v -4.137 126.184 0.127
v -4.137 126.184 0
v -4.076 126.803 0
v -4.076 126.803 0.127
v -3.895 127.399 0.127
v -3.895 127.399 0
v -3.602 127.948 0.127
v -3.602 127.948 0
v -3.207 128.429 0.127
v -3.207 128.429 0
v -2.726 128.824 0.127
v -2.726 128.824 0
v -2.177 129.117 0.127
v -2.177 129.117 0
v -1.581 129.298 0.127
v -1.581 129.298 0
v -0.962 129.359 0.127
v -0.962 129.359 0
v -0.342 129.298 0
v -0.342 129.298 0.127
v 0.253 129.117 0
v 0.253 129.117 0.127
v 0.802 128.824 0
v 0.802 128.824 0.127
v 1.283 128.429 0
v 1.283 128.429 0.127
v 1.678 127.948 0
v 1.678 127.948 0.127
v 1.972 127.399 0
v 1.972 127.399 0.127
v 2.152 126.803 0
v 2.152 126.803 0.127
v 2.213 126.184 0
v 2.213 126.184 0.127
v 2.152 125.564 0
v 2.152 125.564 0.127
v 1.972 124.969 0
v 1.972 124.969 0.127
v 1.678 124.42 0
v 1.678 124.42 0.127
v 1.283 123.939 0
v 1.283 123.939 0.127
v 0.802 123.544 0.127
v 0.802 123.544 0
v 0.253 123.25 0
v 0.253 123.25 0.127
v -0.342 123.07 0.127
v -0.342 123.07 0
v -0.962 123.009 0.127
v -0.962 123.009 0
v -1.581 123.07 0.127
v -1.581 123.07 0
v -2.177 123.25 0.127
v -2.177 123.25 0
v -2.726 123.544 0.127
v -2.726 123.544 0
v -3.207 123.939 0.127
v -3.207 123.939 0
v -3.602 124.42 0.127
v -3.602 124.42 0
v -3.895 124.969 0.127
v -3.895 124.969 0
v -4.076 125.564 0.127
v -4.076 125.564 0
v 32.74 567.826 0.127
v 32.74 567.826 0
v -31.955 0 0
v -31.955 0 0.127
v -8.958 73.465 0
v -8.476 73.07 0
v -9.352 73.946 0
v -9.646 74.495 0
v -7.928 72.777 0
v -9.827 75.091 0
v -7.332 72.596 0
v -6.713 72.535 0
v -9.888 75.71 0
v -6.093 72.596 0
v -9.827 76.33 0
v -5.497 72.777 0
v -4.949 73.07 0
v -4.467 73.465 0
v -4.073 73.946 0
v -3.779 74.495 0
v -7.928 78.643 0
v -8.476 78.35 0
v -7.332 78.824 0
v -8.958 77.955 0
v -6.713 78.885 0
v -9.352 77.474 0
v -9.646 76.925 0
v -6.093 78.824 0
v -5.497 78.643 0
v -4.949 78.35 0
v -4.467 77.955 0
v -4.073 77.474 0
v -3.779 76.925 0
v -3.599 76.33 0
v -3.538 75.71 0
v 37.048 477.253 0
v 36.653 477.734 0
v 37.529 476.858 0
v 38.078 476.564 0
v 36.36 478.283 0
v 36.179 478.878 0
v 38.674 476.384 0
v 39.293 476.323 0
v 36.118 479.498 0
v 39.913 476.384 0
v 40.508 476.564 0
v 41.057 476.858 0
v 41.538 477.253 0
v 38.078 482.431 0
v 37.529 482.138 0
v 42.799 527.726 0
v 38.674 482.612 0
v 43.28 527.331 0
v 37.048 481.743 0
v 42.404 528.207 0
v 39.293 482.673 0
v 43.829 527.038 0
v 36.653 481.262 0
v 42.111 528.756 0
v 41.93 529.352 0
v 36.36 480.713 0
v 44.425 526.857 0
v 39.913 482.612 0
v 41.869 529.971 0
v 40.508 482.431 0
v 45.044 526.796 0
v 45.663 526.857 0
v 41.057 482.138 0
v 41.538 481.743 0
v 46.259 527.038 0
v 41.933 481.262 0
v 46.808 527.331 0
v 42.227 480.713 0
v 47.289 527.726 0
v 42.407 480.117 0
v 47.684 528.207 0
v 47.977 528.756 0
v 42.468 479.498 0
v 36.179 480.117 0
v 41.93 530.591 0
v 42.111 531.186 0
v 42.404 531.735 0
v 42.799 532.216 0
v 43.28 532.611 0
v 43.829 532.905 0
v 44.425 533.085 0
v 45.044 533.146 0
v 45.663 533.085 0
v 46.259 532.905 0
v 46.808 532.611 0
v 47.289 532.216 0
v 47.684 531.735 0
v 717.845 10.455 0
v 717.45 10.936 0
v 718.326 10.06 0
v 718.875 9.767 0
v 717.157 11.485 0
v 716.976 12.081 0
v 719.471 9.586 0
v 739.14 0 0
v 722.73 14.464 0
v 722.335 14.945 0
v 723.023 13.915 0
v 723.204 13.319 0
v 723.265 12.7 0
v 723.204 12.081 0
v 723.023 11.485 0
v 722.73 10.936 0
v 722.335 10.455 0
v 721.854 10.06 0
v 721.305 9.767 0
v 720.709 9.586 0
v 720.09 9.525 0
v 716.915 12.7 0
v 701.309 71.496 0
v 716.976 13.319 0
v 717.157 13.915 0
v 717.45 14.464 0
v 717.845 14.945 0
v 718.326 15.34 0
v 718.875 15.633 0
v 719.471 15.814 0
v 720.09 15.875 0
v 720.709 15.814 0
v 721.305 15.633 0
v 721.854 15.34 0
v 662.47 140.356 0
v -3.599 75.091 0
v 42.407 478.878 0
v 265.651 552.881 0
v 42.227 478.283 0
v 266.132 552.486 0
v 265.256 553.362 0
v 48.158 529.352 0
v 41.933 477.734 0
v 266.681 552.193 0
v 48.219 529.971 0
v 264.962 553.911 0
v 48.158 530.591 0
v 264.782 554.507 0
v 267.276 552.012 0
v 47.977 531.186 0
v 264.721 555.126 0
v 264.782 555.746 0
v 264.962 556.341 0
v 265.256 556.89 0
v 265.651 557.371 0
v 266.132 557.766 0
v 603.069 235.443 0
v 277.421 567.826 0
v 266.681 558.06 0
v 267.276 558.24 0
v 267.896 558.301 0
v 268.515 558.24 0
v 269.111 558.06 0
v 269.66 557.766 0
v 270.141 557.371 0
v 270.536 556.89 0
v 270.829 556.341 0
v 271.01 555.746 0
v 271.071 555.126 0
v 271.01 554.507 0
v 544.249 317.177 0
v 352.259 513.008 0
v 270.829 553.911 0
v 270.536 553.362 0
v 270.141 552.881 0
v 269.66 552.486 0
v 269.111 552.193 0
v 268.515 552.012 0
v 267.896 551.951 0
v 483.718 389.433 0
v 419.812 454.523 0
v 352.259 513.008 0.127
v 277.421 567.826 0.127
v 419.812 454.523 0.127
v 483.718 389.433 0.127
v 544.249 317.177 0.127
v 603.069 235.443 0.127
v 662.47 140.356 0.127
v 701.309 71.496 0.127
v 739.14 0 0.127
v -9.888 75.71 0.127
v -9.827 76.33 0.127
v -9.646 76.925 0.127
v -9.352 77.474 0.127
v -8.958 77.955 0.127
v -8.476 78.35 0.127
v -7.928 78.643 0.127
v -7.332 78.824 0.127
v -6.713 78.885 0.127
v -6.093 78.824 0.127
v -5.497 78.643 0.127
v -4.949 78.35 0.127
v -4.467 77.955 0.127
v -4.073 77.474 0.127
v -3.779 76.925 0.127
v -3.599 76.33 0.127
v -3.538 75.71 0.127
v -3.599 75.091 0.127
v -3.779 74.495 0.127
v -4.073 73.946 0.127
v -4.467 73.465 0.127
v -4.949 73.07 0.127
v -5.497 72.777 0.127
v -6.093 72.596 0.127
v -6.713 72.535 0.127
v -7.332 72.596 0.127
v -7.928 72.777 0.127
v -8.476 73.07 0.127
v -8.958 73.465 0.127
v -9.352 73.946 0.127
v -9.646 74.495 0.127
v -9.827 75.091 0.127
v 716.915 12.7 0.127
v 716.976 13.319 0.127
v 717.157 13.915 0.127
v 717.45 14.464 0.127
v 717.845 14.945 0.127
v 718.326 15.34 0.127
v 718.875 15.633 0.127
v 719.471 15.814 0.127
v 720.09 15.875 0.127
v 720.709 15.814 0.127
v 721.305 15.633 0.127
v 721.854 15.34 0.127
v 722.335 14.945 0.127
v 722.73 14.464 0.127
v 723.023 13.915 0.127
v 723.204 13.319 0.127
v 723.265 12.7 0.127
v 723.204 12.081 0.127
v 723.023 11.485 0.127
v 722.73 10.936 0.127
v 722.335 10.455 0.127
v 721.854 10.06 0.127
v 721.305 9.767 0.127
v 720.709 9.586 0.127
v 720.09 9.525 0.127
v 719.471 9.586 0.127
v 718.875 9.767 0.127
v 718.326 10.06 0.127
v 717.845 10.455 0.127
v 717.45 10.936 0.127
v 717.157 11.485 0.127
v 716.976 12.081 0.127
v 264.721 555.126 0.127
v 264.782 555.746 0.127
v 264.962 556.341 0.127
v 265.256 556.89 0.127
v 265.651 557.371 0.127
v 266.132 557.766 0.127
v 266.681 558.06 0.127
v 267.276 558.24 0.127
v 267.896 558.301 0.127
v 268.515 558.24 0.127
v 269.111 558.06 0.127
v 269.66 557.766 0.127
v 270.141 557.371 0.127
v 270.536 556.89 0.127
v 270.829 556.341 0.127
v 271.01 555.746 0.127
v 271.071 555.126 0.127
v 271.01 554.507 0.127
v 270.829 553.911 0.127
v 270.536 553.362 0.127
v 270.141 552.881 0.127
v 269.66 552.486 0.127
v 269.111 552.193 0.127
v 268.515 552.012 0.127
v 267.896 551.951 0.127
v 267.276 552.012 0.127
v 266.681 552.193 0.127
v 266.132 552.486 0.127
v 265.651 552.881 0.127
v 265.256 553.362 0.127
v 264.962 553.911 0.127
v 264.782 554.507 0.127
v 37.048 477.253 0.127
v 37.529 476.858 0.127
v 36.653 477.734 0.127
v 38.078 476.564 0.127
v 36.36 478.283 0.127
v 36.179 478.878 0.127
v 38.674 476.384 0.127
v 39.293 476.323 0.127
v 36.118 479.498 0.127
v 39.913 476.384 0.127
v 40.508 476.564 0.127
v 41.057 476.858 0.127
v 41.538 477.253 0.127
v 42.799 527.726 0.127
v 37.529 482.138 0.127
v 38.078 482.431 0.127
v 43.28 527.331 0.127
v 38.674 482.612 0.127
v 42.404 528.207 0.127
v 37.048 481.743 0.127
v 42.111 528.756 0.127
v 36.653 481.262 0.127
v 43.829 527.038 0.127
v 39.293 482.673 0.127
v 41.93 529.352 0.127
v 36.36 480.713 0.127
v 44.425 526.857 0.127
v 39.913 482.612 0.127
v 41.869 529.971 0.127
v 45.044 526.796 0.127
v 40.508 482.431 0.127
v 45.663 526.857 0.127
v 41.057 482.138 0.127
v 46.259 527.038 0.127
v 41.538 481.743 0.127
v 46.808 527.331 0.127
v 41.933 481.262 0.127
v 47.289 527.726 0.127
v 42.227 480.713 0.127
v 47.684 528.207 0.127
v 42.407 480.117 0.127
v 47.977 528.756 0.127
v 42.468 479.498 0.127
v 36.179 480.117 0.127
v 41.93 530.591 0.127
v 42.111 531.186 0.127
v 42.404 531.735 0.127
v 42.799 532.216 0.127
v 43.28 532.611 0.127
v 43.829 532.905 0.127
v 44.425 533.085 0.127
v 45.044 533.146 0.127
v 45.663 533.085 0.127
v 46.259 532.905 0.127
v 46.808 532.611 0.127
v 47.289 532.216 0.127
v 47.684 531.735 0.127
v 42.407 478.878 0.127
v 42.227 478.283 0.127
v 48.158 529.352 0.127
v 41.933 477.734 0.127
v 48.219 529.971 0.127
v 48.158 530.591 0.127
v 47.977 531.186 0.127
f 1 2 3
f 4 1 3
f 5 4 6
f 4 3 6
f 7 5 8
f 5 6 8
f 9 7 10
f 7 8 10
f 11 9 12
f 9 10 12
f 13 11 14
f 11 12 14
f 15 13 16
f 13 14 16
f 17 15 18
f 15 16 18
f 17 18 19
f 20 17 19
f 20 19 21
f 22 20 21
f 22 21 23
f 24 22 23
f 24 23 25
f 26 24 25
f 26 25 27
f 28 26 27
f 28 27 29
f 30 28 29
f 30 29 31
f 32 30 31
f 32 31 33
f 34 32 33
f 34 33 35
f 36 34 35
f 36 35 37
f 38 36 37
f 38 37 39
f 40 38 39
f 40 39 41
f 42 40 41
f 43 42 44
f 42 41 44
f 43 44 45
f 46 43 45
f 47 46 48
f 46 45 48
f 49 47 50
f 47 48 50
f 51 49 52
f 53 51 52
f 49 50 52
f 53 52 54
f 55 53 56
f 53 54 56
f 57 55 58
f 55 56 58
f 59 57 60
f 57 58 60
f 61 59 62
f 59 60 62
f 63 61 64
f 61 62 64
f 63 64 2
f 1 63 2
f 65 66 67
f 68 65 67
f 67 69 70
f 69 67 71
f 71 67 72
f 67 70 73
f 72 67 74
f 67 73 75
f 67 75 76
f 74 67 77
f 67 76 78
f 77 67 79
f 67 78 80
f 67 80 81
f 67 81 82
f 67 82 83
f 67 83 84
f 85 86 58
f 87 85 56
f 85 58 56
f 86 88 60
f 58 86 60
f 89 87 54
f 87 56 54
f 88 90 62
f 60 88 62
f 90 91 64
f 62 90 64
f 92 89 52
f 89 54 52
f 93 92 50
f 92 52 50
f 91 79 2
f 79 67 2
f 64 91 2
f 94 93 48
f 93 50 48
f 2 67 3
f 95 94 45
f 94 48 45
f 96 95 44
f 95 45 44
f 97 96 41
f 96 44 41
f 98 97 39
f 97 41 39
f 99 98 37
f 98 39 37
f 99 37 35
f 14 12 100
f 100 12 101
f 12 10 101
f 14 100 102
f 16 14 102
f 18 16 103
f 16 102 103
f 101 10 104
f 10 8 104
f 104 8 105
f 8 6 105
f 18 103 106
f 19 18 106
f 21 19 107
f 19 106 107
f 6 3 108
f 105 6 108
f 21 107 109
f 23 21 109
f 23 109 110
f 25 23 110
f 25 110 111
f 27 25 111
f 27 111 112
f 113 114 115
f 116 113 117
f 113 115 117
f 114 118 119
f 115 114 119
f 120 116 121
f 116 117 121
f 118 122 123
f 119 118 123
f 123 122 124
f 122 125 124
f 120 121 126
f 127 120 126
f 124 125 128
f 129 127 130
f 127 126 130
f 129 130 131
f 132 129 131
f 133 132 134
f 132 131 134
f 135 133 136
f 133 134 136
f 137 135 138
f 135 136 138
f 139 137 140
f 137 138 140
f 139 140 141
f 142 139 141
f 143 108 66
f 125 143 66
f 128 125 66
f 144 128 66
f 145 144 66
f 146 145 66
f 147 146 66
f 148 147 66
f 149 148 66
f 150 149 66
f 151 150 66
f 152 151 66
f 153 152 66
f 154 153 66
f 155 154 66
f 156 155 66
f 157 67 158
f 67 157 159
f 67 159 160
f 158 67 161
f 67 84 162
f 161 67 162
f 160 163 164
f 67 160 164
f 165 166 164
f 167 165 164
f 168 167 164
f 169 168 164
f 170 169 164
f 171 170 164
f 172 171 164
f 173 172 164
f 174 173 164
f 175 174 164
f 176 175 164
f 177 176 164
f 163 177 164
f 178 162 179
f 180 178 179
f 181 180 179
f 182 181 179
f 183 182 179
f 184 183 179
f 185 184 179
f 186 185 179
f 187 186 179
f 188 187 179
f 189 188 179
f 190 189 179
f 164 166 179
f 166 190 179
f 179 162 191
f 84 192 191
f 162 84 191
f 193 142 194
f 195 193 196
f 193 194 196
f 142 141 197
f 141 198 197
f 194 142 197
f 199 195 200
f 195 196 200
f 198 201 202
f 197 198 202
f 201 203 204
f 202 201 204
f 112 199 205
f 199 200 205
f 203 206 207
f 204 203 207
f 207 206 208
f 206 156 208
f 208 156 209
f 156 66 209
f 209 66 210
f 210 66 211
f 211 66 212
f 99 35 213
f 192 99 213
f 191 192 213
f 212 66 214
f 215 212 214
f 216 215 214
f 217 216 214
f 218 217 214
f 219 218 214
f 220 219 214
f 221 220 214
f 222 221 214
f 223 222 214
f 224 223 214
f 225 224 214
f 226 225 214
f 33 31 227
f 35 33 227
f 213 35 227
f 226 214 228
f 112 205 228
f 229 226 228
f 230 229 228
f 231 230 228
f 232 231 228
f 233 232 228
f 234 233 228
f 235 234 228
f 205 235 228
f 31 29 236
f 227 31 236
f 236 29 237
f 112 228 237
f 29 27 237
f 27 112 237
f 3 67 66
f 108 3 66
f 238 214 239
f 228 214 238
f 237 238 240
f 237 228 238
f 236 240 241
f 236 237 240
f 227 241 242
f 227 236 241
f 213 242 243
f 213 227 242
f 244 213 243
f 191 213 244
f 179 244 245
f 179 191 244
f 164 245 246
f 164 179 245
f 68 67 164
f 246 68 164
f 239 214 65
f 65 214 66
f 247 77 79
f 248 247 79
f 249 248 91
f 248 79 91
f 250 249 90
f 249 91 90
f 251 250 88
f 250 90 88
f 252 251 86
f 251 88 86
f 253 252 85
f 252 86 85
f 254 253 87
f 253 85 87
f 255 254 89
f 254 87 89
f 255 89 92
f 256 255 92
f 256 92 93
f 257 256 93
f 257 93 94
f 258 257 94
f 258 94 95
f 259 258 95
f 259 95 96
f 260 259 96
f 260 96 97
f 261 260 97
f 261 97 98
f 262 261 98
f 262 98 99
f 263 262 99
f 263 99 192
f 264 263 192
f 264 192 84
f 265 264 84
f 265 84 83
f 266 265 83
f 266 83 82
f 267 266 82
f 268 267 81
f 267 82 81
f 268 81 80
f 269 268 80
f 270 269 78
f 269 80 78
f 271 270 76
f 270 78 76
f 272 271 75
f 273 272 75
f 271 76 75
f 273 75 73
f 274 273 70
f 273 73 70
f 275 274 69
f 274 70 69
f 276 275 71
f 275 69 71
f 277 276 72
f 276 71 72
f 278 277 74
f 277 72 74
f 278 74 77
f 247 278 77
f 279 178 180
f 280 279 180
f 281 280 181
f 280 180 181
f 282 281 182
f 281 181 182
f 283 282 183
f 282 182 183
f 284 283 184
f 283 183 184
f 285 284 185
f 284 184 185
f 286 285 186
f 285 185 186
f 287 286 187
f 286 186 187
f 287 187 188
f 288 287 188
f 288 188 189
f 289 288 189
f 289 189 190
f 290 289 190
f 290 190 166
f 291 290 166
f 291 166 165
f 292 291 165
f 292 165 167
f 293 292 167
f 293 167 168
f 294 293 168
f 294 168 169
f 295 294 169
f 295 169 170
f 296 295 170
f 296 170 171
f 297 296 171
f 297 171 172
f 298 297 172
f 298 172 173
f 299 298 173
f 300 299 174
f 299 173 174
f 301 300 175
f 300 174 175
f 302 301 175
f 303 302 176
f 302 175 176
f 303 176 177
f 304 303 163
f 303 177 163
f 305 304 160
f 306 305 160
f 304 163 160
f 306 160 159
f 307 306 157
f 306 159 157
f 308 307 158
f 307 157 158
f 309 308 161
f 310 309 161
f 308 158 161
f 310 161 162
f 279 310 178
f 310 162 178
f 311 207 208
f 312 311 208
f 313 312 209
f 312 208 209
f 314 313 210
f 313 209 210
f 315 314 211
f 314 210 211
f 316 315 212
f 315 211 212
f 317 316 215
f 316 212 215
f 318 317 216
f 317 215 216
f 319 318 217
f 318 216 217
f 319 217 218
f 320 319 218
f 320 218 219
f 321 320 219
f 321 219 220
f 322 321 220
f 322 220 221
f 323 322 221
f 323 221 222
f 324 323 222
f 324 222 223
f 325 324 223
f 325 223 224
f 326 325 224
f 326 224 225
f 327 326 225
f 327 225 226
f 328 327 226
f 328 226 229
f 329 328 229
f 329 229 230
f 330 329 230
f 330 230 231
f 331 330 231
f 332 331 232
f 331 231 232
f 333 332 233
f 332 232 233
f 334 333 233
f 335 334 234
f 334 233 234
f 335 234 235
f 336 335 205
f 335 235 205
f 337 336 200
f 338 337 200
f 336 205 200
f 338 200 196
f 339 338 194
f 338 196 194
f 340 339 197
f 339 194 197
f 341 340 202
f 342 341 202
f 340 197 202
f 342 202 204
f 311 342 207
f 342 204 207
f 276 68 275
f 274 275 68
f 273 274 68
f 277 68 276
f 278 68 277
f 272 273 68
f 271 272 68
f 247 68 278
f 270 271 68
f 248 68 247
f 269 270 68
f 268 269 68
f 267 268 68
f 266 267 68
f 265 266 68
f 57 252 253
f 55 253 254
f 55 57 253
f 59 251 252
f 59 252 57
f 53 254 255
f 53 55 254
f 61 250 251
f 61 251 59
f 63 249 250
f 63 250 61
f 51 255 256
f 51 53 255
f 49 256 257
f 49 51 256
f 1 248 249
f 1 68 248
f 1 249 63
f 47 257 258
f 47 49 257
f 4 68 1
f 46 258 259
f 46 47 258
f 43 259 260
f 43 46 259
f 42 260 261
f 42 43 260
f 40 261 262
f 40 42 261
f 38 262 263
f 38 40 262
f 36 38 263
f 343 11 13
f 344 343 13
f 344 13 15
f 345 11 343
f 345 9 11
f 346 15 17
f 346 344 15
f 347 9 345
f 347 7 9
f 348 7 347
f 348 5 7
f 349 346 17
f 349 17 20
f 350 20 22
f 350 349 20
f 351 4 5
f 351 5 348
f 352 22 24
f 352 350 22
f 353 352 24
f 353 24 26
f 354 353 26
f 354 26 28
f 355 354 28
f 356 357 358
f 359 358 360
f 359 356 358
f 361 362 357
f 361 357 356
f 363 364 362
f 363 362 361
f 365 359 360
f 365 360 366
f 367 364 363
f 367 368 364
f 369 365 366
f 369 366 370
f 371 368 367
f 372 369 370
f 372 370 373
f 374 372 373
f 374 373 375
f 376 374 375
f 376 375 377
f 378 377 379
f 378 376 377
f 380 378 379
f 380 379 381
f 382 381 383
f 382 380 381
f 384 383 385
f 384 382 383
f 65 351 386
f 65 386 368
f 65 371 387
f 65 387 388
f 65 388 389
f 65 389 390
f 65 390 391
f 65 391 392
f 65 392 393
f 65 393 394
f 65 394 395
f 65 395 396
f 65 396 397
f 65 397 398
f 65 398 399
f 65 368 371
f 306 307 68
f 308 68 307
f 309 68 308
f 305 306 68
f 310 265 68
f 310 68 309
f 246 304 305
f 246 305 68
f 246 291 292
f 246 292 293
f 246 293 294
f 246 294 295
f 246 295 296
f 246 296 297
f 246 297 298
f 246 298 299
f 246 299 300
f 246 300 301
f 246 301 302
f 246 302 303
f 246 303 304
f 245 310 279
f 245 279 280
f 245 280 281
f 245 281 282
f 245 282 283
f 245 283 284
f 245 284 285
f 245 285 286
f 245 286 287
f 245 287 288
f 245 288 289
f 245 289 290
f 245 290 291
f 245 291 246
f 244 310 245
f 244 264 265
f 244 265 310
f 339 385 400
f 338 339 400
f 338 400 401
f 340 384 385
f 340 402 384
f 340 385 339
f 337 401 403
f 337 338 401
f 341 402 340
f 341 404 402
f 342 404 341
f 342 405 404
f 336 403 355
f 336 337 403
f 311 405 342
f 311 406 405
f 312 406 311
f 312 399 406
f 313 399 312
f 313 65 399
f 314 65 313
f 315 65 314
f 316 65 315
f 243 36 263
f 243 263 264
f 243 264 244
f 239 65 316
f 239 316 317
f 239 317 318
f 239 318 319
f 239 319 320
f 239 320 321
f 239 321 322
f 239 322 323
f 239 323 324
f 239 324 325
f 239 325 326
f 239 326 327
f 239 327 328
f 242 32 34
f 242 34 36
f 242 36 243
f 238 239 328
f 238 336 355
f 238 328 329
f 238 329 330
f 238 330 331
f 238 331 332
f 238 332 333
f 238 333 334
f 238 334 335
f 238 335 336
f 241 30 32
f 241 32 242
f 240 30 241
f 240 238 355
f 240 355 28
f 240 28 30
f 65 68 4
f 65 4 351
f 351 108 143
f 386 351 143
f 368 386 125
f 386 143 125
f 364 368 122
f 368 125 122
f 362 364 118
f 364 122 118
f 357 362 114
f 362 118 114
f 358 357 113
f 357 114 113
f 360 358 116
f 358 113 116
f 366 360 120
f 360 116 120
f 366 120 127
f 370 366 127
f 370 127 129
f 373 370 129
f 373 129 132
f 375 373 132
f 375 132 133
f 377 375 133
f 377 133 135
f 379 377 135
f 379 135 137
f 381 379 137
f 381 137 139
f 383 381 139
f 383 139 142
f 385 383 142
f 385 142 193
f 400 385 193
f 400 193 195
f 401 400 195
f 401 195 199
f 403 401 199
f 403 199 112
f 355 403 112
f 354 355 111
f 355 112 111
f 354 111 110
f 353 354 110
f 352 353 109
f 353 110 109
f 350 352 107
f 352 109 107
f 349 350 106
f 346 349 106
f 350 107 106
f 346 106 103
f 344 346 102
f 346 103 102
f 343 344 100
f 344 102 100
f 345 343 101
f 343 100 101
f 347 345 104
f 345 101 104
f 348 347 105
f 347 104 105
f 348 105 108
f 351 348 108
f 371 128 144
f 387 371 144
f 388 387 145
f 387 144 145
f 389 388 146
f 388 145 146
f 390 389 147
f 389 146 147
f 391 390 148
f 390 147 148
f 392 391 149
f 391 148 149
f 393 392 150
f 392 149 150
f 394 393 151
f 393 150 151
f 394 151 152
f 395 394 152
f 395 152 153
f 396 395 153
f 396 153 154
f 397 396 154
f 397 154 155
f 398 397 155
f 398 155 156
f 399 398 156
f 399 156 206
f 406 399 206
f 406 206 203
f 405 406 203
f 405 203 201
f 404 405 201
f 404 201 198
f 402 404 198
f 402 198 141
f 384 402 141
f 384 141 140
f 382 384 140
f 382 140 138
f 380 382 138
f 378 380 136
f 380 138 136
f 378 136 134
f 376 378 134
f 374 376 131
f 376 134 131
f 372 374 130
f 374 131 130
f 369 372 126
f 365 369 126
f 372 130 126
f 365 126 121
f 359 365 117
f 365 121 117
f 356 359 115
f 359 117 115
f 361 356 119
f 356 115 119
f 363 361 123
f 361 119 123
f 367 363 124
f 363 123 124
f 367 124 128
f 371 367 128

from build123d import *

# Parameters (mm, degrees)
BOSS_EXTRUDE1_DEPTH             = 0.127
BOSS_EXTRUDE2_DEPTH             = 0.127
F_1_4_0_25_DIAMETER_HOLE2_D     = 6.35
F_1_4_0_25_DIAMETER_HOLE3_D     = 6.35
F_1_4_0_25_DIAMETER_HOLE3_DEPTH = 0.127


with BuildPart() as part:
    # Sketch1 → Boss-Extrude1 (new body)
    with BuildSketch(Plane.XY):
        with BuildLine():
            Line((0, 0), (739.14, 0))
            add(Edge.make_bspline(
                [(277.420636668, 567.826315519), (496.859161811, 420.297110317), (620.758181585, 229.590161119), (739.14, 0)],
                knots=[0, 0, 0, 0, 1, 1, 1, 1], degree=3))
            Line((277.420636668, 567.826315519), (64.695636668, 567.826315519))
            Line((64.695636668, 567.826315519), (0, 0))
        make_face()
    extrude(amount=BOSS_EXTRUDE1_DEPTH)

    # Sketch5 → Boss-Extrude2 (add)
    with BuildSketch(Plane(origin=(0, 0, 0), x_dir=(-1, 0, 0), z_dir=(0, 0, -1))):
        Polygon((-64.695636668, 567.826315519), (-32.740222655, 567.826315519), (31.955414013, 0), (0, 0), align=None)
    extrude(amount=-BOSS_EXTRUDE2_DEPTH)

    # 1/4 (0.25) Diameter Hole2 (through all)
    with Locations(Plane.XY.offset(0.127)):
        with Locations((-6.712513837, 75.710175403), (-0.961790578, 126.183625671), (39.293272238, 479.49777755), (45.043995497, 529.971227818)):
            Hole(F_1_4_0_25_DIAMETER_HOLE2_D / 2)

    # 1/4 (0.25) Diameter Hole3
    with Locations(Plane.XY.offset(0.127)):
        with Locations((720.09, 12.7), (267.895636668, 555.126315519)):
            Hole(F_1_4_0_25_DIAMETER_HOLE3_D / 2, depth=F_1_4_0_25_DIAMETER_HOLE3_DEPTH)


solid = part.part
